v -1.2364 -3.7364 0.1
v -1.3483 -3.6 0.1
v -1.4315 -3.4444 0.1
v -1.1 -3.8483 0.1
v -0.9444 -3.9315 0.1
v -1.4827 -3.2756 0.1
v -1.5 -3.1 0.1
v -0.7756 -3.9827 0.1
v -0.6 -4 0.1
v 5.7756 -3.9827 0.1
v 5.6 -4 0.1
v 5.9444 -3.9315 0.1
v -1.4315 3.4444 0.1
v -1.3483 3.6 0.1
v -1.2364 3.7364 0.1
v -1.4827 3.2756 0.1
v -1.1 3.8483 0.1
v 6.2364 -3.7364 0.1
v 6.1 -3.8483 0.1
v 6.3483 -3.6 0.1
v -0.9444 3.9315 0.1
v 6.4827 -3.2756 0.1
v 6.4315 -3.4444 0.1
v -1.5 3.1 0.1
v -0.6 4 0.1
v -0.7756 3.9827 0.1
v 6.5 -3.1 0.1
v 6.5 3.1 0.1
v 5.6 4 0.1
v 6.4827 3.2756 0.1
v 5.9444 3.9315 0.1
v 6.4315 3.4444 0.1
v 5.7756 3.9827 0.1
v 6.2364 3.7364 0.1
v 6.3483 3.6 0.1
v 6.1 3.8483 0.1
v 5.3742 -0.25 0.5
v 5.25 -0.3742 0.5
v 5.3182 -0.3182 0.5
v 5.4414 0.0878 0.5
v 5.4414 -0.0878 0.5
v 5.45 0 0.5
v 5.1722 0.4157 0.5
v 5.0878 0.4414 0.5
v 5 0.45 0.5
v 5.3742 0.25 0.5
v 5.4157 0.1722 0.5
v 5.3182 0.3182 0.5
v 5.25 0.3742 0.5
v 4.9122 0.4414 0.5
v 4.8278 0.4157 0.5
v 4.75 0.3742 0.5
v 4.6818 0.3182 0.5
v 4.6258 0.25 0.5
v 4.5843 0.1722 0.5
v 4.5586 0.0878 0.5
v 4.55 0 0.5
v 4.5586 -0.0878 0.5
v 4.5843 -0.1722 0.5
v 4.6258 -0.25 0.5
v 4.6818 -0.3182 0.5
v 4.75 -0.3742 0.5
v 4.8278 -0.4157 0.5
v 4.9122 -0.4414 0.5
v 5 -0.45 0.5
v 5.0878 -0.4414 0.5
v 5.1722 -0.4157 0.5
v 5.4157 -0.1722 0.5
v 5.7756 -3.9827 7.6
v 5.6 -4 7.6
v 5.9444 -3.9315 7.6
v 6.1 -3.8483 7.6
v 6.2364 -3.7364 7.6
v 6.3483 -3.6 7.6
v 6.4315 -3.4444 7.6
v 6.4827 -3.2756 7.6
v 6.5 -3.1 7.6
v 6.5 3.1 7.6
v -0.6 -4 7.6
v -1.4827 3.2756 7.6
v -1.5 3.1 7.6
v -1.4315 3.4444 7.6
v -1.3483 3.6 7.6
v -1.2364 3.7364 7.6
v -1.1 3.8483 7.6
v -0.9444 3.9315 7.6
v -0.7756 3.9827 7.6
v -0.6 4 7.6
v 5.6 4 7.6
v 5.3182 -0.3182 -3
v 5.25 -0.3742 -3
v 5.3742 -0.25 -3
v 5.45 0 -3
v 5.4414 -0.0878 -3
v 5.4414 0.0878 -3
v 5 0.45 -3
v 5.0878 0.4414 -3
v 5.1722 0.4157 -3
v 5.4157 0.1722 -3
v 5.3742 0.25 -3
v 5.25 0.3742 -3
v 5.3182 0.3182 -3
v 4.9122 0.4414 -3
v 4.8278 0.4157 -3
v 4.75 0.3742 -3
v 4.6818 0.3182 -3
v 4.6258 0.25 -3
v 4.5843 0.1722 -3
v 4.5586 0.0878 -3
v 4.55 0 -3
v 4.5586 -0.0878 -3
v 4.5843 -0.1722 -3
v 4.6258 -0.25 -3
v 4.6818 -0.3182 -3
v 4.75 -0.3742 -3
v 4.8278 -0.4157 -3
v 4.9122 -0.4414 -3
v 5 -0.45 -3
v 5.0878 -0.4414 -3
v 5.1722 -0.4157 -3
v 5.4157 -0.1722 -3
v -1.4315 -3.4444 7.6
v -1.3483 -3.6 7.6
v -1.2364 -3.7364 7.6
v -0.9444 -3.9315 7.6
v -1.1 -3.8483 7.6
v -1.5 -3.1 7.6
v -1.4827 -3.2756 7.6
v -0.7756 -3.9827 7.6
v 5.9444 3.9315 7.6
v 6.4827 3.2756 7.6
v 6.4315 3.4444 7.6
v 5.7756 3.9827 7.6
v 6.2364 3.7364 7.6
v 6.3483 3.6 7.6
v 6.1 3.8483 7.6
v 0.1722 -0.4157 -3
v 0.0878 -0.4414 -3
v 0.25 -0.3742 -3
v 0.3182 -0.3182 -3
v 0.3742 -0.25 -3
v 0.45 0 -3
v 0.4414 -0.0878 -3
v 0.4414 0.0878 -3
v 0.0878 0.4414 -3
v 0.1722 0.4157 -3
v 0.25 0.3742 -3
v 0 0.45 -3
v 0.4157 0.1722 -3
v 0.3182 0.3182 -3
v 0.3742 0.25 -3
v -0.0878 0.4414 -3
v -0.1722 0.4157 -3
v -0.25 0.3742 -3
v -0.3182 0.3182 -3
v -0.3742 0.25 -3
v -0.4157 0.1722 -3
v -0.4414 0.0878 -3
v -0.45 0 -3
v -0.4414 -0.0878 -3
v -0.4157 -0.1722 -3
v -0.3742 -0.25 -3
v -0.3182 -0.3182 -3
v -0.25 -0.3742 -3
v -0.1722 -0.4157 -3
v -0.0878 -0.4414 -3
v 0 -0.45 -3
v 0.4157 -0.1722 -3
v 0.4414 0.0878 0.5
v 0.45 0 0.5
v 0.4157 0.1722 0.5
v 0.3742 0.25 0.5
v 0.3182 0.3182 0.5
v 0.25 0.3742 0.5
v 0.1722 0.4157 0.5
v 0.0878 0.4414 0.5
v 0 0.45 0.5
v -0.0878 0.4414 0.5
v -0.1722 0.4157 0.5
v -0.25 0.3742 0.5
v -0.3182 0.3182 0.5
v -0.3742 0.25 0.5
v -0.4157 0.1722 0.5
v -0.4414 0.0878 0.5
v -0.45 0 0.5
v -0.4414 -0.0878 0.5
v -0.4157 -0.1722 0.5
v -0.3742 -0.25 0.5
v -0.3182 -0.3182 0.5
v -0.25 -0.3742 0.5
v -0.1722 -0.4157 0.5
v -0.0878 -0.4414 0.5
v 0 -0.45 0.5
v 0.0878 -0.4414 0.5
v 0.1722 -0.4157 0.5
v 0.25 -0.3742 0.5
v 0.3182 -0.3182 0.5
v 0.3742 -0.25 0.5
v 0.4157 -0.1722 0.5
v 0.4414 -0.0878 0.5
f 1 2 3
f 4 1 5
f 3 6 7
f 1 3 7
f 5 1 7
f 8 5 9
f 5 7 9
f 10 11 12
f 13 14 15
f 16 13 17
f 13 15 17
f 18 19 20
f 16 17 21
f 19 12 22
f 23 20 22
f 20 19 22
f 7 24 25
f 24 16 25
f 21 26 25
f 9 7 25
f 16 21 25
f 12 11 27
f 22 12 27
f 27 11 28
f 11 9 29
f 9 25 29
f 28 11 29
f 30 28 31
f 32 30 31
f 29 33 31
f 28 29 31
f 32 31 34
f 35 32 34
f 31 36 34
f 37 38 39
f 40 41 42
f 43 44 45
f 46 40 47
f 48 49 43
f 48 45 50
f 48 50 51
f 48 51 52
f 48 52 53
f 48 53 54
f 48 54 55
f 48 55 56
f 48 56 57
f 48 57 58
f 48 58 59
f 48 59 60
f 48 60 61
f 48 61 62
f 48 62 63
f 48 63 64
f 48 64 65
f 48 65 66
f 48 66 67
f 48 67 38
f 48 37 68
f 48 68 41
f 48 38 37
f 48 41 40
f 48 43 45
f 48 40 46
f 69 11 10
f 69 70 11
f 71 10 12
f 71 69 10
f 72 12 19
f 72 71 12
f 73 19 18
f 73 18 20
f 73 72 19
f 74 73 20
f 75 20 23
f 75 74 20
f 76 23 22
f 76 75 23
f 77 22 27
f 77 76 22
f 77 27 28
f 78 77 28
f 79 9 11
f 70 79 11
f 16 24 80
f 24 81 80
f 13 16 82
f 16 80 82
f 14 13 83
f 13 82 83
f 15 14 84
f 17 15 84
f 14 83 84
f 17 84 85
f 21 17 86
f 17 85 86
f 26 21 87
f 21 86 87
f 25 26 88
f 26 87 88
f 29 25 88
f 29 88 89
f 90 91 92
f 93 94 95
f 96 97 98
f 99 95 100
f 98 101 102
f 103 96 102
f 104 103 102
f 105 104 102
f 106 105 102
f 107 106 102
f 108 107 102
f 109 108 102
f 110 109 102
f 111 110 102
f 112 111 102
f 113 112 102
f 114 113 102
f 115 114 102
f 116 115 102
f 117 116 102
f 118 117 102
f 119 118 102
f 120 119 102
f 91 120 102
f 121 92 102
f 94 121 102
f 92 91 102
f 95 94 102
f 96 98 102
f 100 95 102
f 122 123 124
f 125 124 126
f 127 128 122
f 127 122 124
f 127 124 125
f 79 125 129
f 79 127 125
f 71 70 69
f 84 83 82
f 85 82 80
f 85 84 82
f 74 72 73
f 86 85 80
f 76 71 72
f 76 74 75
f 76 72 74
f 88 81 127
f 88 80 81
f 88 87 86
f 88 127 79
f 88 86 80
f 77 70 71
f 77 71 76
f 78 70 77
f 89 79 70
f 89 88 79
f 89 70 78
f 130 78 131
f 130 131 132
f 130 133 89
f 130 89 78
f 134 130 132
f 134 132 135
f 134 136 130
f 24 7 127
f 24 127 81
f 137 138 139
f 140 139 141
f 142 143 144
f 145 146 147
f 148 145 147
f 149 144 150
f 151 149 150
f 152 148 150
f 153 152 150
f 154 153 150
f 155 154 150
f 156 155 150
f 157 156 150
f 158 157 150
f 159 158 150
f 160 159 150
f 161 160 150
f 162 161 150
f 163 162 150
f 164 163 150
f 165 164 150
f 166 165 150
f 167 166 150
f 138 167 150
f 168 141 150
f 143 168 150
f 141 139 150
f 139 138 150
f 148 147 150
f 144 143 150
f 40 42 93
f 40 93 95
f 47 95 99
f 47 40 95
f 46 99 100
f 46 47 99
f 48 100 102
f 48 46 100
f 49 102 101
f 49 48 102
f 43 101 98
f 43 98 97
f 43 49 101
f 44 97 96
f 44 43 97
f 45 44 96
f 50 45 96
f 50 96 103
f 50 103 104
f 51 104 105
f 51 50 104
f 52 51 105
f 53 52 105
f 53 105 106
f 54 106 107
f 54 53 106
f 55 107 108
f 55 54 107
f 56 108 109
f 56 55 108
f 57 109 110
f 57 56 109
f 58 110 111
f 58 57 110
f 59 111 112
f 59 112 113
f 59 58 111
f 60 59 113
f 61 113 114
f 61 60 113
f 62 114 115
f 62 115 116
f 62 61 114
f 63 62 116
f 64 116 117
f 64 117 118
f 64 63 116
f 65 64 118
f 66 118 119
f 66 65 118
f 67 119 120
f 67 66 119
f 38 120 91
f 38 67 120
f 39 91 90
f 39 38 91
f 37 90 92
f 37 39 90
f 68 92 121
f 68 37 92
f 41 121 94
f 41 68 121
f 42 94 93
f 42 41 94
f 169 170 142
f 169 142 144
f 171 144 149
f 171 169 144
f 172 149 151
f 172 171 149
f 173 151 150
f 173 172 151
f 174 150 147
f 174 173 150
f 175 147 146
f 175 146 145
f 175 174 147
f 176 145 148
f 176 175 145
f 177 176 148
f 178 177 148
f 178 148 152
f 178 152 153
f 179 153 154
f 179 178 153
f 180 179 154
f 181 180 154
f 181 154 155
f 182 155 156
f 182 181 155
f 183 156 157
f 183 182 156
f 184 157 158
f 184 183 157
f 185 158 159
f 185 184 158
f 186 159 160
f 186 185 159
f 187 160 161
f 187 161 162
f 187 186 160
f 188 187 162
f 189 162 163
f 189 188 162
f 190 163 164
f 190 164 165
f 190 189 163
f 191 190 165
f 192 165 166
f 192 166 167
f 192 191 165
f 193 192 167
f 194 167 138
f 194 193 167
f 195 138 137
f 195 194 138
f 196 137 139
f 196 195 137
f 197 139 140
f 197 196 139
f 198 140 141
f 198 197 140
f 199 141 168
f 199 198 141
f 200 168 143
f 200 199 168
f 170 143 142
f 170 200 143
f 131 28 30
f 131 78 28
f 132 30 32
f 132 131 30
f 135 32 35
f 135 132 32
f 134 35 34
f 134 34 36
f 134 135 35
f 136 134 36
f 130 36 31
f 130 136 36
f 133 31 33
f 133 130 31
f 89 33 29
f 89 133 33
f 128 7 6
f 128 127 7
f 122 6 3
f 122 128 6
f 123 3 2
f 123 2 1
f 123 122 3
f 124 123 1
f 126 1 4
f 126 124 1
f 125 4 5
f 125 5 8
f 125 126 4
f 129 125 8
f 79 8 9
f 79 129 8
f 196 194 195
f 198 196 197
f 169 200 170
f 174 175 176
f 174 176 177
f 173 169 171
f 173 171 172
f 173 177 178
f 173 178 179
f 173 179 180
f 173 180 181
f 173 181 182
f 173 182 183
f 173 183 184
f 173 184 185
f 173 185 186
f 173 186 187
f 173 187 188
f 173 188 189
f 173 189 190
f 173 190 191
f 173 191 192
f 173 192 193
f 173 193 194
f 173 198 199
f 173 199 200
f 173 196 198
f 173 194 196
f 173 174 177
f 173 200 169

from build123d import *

# Parameters (mm, degrees)
SKETCH001_R  = 0.45
PAD001_DEPTH = 3.5
SKETCH_W     = 8
SKETCH_H     = 8
PAD_DEPTH    = 7.5
FILLET_R     = 0.9


with BuildPart() as pad001:
    # Sketch001 → Pad001 (new body)
    with BuildSketch(Plane.XY.offset(0.5)):
        Circle(SKETCH001_R)
        with Locations((5, 0)):
            Circle(SKETCH001_R)
    extrude(amount=-PAD001_DEPTH)


with BuildPart() as fillet_body:
    # Sketch → Pad (new body)
    with BuildSketch(Plane.XY.offset(0.1)):
        with Locations((2.5, 0)):
            Rectangle(SKETCH_W, SKETCH_H)
    extrude(amount=PAD_DEPTH)

    # Fillet
    fillet_edges = [fillet_body.edges().sort_by_distance(p)[0] for p in [
        (6.5, -4, 3.85),
        (6.5, 4, 3.85),
        (-1.5, -4, 3.85),
        (-1.5, 4, 3.85),
    ]]
    fillet(fillet_edges, radius=FILLET_R)


solid = Compound([pad001.part, fillet_body.part])
